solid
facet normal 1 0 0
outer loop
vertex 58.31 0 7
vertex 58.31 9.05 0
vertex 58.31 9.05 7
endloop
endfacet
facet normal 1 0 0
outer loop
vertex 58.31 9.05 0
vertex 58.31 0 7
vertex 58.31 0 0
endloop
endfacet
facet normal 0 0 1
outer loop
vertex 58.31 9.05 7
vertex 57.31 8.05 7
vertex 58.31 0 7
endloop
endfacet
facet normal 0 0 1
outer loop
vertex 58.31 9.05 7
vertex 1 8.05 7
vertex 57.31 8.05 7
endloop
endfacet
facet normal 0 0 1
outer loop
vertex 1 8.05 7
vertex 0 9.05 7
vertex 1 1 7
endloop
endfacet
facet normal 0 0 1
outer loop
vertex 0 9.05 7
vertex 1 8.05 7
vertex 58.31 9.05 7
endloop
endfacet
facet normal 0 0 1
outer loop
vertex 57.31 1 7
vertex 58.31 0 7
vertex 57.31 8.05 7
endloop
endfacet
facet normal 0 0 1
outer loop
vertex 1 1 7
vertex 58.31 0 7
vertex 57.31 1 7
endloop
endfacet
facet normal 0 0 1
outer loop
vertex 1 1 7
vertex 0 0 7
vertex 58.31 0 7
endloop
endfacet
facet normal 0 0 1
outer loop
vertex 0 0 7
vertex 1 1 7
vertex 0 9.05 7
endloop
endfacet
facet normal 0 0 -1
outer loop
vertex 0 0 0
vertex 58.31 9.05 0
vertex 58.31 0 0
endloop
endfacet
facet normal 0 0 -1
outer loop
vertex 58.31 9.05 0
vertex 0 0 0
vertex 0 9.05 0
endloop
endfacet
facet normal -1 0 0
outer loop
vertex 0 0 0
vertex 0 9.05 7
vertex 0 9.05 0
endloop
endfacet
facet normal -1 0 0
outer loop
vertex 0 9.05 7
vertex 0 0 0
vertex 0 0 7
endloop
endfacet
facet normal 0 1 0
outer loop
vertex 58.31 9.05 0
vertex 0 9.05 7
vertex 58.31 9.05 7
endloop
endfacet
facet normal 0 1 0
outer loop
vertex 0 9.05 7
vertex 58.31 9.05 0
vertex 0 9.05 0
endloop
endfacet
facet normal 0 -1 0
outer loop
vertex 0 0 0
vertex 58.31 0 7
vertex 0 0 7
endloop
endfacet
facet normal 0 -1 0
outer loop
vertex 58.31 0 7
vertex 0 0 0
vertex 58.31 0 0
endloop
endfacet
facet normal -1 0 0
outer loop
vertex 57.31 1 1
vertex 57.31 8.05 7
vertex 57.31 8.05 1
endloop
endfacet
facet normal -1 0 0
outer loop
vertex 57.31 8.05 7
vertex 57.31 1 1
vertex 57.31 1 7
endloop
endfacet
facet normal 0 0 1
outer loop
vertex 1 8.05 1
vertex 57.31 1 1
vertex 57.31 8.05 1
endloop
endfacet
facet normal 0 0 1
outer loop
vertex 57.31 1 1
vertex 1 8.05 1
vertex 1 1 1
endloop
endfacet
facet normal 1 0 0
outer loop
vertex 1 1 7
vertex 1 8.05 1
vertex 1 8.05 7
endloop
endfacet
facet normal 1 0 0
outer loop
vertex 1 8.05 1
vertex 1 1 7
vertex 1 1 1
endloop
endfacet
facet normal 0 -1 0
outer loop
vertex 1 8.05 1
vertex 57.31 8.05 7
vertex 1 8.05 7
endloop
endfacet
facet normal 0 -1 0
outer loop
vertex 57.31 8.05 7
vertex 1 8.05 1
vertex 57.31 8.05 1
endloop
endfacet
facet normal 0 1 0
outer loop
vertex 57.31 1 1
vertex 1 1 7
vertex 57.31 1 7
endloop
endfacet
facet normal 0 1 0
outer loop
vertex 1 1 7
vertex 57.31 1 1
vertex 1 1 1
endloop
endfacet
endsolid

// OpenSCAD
width = 56.31;
depth = 7.05;
height = 7;

//single: w=28.31
//double: w=56.31
//triple: w=84.31

difference () {
    cube([width+2,depth+2,height]);
    translate([1,1,1]) cube([width,depth,height]);
};
